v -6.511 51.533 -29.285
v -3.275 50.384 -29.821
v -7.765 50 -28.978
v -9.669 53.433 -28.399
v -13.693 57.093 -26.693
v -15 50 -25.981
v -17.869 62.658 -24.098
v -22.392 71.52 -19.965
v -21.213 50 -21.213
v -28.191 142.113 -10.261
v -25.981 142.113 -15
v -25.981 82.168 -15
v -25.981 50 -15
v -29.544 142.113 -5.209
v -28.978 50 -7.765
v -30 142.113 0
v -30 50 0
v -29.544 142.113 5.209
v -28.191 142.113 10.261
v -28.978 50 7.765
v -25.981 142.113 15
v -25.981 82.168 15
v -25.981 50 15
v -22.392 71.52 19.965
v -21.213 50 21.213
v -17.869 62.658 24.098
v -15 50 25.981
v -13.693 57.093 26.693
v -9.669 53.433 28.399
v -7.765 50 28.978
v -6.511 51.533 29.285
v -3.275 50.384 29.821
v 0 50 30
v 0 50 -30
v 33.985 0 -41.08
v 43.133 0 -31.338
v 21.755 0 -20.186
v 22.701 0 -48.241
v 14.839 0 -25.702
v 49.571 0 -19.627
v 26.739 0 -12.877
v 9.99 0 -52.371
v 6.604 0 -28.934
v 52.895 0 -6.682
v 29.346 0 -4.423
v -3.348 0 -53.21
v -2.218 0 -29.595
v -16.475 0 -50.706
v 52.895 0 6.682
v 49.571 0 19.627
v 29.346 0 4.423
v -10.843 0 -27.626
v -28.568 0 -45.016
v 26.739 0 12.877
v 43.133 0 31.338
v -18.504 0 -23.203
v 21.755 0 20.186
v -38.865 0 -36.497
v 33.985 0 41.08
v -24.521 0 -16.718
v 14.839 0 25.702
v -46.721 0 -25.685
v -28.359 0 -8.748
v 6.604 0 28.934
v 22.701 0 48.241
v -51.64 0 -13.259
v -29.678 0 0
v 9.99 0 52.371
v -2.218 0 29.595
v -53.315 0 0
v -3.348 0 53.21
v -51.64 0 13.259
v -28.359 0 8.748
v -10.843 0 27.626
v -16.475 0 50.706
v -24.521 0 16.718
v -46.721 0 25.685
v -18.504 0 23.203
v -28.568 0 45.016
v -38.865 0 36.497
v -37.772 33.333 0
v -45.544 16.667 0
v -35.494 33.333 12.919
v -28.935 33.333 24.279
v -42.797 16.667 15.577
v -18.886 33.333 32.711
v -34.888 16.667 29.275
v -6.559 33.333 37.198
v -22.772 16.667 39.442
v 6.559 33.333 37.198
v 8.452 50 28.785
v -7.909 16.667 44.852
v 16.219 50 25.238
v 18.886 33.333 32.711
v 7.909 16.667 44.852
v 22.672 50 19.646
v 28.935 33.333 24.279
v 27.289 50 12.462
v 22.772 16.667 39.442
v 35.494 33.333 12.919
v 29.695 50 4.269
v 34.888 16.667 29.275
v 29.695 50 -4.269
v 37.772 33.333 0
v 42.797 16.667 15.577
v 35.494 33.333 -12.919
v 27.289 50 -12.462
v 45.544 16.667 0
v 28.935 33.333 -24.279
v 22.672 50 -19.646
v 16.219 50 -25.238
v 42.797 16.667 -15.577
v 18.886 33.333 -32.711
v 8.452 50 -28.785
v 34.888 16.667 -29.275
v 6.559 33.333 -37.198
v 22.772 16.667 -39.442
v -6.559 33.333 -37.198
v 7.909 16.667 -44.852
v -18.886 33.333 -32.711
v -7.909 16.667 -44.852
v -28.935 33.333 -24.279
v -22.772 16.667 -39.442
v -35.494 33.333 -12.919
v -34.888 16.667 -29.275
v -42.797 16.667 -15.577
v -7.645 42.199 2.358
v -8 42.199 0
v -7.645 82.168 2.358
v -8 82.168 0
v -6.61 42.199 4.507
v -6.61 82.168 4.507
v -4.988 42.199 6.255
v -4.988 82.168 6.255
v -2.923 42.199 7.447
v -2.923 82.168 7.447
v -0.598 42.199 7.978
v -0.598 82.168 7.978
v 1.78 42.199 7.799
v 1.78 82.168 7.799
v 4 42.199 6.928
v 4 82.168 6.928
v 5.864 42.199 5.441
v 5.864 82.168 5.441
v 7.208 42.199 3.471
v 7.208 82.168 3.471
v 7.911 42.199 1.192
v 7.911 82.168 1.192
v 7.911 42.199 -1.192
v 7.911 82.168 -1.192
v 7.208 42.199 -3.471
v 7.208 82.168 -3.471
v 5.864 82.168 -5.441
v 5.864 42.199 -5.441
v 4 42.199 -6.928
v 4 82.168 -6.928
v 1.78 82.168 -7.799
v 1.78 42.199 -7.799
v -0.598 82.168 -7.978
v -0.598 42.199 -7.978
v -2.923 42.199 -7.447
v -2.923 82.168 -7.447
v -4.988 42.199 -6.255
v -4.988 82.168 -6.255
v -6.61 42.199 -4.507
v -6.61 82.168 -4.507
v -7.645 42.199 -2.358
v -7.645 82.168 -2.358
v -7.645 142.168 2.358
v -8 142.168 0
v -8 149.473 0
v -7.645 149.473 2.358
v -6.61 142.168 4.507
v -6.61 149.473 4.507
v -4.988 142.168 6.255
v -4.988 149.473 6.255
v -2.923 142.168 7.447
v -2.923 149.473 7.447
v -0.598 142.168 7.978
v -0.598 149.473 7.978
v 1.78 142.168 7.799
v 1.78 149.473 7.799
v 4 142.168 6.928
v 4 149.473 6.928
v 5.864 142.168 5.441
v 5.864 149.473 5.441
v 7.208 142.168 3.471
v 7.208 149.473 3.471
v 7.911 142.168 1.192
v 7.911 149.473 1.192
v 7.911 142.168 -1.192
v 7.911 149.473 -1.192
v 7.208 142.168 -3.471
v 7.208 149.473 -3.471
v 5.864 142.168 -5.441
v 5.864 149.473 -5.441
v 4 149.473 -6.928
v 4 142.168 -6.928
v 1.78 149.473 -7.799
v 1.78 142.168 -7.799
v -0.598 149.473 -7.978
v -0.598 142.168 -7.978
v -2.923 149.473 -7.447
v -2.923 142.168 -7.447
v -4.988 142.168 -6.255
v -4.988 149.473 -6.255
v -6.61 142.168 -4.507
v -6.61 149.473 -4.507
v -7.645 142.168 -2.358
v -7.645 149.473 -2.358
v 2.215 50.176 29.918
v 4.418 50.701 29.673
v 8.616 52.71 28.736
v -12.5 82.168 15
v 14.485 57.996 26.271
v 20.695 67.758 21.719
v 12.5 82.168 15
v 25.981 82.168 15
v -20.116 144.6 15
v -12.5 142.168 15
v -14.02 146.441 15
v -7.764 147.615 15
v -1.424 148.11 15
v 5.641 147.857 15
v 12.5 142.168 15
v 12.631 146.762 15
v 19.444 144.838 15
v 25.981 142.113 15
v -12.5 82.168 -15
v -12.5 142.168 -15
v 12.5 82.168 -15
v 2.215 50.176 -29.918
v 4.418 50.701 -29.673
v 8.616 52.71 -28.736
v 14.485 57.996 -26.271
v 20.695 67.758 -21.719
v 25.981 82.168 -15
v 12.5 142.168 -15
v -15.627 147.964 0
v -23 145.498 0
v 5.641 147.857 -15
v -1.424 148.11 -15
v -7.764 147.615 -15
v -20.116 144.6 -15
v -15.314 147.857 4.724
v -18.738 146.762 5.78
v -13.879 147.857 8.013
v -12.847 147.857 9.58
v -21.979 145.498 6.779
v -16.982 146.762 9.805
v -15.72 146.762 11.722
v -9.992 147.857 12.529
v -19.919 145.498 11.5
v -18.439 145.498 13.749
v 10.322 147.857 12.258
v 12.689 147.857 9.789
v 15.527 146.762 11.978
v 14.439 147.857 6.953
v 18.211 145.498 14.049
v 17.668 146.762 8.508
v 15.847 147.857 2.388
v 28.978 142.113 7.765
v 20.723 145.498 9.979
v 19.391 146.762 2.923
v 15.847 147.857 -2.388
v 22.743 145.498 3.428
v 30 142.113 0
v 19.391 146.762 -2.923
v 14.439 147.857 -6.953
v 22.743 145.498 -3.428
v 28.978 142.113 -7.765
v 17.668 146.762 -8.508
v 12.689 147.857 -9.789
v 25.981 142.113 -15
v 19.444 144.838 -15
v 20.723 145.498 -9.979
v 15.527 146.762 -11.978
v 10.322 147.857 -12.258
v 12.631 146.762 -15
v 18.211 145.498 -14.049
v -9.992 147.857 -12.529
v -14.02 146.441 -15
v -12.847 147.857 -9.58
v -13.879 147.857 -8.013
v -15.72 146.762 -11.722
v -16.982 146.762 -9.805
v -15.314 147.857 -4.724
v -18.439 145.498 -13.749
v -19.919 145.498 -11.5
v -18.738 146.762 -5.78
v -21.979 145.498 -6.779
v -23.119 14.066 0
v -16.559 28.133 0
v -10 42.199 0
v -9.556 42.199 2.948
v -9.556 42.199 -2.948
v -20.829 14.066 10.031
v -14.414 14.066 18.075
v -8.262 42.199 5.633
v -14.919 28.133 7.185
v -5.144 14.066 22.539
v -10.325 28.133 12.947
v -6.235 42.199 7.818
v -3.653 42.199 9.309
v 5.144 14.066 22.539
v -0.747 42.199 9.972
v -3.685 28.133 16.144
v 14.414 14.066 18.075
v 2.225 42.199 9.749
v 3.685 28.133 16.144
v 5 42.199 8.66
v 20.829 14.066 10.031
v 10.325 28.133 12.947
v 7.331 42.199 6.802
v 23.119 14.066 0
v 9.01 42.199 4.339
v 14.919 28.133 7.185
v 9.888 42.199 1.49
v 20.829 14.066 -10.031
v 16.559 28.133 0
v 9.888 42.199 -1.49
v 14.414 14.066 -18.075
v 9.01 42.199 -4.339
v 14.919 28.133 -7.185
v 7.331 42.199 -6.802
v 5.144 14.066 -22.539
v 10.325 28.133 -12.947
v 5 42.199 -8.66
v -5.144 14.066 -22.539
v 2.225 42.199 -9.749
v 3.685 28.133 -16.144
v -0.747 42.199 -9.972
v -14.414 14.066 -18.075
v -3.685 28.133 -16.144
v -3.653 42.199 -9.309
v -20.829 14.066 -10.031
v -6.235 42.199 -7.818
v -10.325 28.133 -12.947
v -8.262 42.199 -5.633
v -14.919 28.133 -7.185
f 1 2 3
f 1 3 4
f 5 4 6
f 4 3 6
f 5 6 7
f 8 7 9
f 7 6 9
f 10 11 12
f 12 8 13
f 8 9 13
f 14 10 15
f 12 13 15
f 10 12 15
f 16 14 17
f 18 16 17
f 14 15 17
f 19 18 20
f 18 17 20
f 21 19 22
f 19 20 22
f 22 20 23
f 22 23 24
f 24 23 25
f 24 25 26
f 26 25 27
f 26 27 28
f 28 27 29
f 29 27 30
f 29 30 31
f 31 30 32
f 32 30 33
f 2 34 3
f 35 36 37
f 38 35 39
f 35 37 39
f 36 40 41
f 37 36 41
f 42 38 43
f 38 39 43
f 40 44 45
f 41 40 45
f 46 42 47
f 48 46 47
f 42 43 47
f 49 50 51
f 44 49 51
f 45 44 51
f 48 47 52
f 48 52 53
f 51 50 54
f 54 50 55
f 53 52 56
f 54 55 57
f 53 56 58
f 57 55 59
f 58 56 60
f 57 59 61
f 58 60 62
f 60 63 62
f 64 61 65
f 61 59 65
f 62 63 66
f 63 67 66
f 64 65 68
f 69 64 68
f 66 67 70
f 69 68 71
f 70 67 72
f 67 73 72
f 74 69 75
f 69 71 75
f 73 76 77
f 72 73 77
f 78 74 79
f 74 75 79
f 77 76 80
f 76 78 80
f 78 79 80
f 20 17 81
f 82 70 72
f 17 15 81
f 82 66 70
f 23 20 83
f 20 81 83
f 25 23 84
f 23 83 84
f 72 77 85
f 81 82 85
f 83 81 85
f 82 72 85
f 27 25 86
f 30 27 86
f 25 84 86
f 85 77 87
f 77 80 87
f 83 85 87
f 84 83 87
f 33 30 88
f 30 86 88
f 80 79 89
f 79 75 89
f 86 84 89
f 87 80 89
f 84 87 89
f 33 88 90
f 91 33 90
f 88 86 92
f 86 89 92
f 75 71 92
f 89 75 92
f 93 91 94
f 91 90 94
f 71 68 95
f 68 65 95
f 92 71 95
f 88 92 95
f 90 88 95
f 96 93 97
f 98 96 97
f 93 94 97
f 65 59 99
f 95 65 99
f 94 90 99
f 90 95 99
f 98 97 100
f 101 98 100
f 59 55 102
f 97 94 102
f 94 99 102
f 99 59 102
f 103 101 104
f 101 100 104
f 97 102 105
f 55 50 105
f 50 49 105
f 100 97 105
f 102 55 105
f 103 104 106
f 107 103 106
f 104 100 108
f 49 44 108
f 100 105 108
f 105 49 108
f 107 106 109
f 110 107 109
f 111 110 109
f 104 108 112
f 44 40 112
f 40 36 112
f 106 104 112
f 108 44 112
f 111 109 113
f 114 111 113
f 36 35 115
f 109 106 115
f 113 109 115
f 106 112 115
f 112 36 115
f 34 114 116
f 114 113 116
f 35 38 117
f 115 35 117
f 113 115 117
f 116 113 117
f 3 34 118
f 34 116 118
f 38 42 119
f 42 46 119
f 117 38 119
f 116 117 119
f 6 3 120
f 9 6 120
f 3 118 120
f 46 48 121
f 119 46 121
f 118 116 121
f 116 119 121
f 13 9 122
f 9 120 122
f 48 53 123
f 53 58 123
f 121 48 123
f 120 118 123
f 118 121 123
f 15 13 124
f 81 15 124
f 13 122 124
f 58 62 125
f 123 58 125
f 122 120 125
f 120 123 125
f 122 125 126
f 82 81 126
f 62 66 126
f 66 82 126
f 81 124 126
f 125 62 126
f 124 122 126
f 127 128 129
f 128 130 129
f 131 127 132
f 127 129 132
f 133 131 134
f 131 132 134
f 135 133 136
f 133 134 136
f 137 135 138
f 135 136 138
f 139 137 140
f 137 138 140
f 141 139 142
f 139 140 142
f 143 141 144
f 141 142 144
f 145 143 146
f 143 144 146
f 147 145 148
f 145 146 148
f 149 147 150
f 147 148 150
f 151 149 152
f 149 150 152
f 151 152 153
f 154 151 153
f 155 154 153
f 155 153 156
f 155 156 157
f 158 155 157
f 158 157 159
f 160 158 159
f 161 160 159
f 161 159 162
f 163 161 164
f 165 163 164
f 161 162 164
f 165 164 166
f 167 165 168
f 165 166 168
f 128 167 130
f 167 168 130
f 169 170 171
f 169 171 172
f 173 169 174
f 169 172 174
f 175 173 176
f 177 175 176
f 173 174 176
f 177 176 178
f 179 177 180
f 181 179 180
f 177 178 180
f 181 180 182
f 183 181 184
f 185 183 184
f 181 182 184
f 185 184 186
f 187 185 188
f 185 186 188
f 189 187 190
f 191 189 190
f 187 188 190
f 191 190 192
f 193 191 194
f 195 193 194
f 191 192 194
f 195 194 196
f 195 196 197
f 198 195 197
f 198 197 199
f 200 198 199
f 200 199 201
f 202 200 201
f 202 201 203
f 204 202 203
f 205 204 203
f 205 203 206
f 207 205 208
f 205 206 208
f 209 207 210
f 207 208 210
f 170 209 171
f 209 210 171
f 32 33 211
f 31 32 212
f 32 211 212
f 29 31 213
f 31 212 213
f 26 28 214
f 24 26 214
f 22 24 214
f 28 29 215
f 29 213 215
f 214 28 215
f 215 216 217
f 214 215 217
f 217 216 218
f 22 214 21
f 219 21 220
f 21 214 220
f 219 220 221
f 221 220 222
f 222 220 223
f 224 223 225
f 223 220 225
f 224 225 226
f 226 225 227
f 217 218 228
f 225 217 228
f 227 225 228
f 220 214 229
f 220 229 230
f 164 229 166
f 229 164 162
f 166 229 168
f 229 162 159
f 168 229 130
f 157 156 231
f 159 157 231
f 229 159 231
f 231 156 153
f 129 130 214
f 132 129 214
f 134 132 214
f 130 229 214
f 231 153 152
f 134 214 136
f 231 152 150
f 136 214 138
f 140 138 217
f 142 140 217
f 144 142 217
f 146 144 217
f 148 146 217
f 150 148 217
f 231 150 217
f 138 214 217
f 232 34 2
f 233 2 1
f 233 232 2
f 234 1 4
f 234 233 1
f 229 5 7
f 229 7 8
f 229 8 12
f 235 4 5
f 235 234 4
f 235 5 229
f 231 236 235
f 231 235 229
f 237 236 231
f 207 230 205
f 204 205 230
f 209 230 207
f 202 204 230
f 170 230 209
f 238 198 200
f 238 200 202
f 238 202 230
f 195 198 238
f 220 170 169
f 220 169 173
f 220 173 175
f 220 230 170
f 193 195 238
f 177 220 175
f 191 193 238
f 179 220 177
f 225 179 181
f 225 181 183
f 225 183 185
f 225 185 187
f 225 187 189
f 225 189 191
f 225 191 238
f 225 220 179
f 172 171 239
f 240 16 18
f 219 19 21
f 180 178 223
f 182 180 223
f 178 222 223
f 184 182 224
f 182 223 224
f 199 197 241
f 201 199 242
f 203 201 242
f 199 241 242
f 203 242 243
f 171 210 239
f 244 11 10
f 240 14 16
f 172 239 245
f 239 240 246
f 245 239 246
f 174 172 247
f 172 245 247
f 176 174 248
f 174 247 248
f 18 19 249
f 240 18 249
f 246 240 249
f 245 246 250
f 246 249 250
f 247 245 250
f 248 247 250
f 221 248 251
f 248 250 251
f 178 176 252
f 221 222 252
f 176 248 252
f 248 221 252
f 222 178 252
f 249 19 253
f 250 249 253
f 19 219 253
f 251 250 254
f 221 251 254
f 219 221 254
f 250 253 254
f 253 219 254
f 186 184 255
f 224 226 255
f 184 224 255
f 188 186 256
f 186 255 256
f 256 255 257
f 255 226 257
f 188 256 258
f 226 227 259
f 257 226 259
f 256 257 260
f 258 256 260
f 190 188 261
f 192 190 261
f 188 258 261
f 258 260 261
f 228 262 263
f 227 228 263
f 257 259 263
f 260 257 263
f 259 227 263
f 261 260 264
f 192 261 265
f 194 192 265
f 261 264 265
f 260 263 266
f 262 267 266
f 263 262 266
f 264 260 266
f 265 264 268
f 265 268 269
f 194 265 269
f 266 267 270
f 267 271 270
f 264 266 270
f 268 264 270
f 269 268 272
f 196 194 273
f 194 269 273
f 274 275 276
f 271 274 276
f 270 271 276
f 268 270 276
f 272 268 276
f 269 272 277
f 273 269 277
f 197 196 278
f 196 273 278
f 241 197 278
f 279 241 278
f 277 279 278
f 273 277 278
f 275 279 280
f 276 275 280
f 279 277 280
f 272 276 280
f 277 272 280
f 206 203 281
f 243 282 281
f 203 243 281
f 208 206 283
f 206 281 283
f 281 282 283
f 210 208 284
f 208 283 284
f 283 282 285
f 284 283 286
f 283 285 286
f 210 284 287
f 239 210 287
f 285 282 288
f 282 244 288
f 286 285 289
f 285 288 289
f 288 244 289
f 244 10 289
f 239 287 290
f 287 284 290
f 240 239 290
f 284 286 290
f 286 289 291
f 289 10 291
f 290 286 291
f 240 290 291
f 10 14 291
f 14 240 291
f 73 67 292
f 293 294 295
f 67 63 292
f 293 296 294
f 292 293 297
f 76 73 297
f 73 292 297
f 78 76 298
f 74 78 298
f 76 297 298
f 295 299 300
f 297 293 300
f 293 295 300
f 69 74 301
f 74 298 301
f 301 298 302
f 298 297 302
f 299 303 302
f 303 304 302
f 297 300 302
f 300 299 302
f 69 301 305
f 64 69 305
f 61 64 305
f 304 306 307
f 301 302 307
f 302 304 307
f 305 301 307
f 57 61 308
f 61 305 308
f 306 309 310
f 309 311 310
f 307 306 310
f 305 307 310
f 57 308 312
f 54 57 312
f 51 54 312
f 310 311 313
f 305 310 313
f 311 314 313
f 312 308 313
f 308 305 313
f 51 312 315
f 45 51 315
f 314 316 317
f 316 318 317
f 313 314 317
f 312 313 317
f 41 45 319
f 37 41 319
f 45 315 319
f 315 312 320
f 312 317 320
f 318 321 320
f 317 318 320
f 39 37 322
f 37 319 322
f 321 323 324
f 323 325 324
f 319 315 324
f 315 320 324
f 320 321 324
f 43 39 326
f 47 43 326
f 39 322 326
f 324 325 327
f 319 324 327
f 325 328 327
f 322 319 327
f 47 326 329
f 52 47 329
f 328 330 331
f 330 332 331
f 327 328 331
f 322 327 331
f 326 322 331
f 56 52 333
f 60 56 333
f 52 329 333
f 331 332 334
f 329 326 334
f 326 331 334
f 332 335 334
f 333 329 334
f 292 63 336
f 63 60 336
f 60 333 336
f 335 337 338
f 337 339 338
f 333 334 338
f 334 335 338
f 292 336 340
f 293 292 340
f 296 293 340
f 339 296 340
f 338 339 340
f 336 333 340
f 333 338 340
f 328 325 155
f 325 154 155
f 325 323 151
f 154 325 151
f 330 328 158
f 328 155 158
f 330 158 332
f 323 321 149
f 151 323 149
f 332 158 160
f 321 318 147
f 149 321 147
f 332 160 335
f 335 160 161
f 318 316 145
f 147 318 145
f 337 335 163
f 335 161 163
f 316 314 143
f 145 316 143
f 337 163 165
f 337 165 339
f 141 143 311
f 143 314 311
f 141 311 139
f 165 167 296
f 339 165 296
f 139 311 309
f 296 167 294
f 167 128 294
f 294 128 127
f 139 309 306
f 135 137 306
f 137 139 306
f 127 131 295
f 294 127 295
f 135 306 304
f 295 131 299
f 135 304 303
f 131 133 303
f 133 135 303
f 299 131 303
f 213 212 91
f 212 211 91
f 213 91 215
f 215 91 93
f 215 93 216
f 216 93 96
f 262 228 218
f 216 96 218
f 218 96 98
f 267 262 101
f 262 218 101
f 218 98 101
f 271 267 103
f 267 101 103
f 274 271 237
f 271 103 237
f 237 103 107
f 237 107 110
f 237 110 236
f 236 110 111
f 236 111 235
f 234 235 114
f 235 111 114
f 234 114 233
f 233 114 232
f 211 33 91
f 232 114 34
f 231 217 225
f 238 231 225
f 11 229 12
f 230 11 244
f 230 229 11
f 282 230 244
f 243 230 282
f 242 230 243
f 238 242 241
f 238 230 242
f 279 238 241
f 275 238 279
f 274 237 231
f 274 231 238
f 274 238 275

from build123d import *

# Parameters (mm, degrees)
F3_DEPTH = 30
F5_W     = 25
F5_H     = 60
F6_DEPTH = 68.316383


with BuildPart() as f1:
    # F0 (on Top) → F1 (revolve)
    with BuildSketch(Plane.XY):
        with BuildLine():
            Line((-30, 50), (-53.315383, 0))
            Line((-53.315383, 0), (-29.677889, 0))
            Line((-29.677889, 0), (-10, 42.19937))
            Line((-10, 42.19937), (-8, 42.19937))
            Line((-8, 42.19937), (-8, 149.473135))
            ThreePointArc((-8, 149.473135), (-19.353102, 146.848573), (-30, 142.113087))
            Line((-30, 142.113087), (-30, 50))
        make_face()
    revolve(axis=Axis((0, 44.812715, 0), (0, 1, 0)))

    # F2 (on Right) → F3 (cut, symmetric)
    with BuildSketch(Plane.YZ):
        Polygon((149.473135, 30), (50, 30), (82.167604, 15), (149.473135, 15), align=None)
    extrude(amount=F3_DEPTH, both=True, mode=Mode.SUBTRACT)

    # F4: F1 across plane


with BuildPart() as f1_1:
    add(f1.part)
    add(f1.part.mirror(Plane.XY), mode=Mode.INTERSECT)

    # F5 (on face) → F6 (cut, through all)
    with BuildSketch(Plane.XY.offset(15)):
        with Locations((0, 112.167604)):
            Rectangle(F5_W, F5_H)
    extrude(amount=-F6_DEPTH, mode=Mode.SUBTRACT)


solid = f1_1.part
